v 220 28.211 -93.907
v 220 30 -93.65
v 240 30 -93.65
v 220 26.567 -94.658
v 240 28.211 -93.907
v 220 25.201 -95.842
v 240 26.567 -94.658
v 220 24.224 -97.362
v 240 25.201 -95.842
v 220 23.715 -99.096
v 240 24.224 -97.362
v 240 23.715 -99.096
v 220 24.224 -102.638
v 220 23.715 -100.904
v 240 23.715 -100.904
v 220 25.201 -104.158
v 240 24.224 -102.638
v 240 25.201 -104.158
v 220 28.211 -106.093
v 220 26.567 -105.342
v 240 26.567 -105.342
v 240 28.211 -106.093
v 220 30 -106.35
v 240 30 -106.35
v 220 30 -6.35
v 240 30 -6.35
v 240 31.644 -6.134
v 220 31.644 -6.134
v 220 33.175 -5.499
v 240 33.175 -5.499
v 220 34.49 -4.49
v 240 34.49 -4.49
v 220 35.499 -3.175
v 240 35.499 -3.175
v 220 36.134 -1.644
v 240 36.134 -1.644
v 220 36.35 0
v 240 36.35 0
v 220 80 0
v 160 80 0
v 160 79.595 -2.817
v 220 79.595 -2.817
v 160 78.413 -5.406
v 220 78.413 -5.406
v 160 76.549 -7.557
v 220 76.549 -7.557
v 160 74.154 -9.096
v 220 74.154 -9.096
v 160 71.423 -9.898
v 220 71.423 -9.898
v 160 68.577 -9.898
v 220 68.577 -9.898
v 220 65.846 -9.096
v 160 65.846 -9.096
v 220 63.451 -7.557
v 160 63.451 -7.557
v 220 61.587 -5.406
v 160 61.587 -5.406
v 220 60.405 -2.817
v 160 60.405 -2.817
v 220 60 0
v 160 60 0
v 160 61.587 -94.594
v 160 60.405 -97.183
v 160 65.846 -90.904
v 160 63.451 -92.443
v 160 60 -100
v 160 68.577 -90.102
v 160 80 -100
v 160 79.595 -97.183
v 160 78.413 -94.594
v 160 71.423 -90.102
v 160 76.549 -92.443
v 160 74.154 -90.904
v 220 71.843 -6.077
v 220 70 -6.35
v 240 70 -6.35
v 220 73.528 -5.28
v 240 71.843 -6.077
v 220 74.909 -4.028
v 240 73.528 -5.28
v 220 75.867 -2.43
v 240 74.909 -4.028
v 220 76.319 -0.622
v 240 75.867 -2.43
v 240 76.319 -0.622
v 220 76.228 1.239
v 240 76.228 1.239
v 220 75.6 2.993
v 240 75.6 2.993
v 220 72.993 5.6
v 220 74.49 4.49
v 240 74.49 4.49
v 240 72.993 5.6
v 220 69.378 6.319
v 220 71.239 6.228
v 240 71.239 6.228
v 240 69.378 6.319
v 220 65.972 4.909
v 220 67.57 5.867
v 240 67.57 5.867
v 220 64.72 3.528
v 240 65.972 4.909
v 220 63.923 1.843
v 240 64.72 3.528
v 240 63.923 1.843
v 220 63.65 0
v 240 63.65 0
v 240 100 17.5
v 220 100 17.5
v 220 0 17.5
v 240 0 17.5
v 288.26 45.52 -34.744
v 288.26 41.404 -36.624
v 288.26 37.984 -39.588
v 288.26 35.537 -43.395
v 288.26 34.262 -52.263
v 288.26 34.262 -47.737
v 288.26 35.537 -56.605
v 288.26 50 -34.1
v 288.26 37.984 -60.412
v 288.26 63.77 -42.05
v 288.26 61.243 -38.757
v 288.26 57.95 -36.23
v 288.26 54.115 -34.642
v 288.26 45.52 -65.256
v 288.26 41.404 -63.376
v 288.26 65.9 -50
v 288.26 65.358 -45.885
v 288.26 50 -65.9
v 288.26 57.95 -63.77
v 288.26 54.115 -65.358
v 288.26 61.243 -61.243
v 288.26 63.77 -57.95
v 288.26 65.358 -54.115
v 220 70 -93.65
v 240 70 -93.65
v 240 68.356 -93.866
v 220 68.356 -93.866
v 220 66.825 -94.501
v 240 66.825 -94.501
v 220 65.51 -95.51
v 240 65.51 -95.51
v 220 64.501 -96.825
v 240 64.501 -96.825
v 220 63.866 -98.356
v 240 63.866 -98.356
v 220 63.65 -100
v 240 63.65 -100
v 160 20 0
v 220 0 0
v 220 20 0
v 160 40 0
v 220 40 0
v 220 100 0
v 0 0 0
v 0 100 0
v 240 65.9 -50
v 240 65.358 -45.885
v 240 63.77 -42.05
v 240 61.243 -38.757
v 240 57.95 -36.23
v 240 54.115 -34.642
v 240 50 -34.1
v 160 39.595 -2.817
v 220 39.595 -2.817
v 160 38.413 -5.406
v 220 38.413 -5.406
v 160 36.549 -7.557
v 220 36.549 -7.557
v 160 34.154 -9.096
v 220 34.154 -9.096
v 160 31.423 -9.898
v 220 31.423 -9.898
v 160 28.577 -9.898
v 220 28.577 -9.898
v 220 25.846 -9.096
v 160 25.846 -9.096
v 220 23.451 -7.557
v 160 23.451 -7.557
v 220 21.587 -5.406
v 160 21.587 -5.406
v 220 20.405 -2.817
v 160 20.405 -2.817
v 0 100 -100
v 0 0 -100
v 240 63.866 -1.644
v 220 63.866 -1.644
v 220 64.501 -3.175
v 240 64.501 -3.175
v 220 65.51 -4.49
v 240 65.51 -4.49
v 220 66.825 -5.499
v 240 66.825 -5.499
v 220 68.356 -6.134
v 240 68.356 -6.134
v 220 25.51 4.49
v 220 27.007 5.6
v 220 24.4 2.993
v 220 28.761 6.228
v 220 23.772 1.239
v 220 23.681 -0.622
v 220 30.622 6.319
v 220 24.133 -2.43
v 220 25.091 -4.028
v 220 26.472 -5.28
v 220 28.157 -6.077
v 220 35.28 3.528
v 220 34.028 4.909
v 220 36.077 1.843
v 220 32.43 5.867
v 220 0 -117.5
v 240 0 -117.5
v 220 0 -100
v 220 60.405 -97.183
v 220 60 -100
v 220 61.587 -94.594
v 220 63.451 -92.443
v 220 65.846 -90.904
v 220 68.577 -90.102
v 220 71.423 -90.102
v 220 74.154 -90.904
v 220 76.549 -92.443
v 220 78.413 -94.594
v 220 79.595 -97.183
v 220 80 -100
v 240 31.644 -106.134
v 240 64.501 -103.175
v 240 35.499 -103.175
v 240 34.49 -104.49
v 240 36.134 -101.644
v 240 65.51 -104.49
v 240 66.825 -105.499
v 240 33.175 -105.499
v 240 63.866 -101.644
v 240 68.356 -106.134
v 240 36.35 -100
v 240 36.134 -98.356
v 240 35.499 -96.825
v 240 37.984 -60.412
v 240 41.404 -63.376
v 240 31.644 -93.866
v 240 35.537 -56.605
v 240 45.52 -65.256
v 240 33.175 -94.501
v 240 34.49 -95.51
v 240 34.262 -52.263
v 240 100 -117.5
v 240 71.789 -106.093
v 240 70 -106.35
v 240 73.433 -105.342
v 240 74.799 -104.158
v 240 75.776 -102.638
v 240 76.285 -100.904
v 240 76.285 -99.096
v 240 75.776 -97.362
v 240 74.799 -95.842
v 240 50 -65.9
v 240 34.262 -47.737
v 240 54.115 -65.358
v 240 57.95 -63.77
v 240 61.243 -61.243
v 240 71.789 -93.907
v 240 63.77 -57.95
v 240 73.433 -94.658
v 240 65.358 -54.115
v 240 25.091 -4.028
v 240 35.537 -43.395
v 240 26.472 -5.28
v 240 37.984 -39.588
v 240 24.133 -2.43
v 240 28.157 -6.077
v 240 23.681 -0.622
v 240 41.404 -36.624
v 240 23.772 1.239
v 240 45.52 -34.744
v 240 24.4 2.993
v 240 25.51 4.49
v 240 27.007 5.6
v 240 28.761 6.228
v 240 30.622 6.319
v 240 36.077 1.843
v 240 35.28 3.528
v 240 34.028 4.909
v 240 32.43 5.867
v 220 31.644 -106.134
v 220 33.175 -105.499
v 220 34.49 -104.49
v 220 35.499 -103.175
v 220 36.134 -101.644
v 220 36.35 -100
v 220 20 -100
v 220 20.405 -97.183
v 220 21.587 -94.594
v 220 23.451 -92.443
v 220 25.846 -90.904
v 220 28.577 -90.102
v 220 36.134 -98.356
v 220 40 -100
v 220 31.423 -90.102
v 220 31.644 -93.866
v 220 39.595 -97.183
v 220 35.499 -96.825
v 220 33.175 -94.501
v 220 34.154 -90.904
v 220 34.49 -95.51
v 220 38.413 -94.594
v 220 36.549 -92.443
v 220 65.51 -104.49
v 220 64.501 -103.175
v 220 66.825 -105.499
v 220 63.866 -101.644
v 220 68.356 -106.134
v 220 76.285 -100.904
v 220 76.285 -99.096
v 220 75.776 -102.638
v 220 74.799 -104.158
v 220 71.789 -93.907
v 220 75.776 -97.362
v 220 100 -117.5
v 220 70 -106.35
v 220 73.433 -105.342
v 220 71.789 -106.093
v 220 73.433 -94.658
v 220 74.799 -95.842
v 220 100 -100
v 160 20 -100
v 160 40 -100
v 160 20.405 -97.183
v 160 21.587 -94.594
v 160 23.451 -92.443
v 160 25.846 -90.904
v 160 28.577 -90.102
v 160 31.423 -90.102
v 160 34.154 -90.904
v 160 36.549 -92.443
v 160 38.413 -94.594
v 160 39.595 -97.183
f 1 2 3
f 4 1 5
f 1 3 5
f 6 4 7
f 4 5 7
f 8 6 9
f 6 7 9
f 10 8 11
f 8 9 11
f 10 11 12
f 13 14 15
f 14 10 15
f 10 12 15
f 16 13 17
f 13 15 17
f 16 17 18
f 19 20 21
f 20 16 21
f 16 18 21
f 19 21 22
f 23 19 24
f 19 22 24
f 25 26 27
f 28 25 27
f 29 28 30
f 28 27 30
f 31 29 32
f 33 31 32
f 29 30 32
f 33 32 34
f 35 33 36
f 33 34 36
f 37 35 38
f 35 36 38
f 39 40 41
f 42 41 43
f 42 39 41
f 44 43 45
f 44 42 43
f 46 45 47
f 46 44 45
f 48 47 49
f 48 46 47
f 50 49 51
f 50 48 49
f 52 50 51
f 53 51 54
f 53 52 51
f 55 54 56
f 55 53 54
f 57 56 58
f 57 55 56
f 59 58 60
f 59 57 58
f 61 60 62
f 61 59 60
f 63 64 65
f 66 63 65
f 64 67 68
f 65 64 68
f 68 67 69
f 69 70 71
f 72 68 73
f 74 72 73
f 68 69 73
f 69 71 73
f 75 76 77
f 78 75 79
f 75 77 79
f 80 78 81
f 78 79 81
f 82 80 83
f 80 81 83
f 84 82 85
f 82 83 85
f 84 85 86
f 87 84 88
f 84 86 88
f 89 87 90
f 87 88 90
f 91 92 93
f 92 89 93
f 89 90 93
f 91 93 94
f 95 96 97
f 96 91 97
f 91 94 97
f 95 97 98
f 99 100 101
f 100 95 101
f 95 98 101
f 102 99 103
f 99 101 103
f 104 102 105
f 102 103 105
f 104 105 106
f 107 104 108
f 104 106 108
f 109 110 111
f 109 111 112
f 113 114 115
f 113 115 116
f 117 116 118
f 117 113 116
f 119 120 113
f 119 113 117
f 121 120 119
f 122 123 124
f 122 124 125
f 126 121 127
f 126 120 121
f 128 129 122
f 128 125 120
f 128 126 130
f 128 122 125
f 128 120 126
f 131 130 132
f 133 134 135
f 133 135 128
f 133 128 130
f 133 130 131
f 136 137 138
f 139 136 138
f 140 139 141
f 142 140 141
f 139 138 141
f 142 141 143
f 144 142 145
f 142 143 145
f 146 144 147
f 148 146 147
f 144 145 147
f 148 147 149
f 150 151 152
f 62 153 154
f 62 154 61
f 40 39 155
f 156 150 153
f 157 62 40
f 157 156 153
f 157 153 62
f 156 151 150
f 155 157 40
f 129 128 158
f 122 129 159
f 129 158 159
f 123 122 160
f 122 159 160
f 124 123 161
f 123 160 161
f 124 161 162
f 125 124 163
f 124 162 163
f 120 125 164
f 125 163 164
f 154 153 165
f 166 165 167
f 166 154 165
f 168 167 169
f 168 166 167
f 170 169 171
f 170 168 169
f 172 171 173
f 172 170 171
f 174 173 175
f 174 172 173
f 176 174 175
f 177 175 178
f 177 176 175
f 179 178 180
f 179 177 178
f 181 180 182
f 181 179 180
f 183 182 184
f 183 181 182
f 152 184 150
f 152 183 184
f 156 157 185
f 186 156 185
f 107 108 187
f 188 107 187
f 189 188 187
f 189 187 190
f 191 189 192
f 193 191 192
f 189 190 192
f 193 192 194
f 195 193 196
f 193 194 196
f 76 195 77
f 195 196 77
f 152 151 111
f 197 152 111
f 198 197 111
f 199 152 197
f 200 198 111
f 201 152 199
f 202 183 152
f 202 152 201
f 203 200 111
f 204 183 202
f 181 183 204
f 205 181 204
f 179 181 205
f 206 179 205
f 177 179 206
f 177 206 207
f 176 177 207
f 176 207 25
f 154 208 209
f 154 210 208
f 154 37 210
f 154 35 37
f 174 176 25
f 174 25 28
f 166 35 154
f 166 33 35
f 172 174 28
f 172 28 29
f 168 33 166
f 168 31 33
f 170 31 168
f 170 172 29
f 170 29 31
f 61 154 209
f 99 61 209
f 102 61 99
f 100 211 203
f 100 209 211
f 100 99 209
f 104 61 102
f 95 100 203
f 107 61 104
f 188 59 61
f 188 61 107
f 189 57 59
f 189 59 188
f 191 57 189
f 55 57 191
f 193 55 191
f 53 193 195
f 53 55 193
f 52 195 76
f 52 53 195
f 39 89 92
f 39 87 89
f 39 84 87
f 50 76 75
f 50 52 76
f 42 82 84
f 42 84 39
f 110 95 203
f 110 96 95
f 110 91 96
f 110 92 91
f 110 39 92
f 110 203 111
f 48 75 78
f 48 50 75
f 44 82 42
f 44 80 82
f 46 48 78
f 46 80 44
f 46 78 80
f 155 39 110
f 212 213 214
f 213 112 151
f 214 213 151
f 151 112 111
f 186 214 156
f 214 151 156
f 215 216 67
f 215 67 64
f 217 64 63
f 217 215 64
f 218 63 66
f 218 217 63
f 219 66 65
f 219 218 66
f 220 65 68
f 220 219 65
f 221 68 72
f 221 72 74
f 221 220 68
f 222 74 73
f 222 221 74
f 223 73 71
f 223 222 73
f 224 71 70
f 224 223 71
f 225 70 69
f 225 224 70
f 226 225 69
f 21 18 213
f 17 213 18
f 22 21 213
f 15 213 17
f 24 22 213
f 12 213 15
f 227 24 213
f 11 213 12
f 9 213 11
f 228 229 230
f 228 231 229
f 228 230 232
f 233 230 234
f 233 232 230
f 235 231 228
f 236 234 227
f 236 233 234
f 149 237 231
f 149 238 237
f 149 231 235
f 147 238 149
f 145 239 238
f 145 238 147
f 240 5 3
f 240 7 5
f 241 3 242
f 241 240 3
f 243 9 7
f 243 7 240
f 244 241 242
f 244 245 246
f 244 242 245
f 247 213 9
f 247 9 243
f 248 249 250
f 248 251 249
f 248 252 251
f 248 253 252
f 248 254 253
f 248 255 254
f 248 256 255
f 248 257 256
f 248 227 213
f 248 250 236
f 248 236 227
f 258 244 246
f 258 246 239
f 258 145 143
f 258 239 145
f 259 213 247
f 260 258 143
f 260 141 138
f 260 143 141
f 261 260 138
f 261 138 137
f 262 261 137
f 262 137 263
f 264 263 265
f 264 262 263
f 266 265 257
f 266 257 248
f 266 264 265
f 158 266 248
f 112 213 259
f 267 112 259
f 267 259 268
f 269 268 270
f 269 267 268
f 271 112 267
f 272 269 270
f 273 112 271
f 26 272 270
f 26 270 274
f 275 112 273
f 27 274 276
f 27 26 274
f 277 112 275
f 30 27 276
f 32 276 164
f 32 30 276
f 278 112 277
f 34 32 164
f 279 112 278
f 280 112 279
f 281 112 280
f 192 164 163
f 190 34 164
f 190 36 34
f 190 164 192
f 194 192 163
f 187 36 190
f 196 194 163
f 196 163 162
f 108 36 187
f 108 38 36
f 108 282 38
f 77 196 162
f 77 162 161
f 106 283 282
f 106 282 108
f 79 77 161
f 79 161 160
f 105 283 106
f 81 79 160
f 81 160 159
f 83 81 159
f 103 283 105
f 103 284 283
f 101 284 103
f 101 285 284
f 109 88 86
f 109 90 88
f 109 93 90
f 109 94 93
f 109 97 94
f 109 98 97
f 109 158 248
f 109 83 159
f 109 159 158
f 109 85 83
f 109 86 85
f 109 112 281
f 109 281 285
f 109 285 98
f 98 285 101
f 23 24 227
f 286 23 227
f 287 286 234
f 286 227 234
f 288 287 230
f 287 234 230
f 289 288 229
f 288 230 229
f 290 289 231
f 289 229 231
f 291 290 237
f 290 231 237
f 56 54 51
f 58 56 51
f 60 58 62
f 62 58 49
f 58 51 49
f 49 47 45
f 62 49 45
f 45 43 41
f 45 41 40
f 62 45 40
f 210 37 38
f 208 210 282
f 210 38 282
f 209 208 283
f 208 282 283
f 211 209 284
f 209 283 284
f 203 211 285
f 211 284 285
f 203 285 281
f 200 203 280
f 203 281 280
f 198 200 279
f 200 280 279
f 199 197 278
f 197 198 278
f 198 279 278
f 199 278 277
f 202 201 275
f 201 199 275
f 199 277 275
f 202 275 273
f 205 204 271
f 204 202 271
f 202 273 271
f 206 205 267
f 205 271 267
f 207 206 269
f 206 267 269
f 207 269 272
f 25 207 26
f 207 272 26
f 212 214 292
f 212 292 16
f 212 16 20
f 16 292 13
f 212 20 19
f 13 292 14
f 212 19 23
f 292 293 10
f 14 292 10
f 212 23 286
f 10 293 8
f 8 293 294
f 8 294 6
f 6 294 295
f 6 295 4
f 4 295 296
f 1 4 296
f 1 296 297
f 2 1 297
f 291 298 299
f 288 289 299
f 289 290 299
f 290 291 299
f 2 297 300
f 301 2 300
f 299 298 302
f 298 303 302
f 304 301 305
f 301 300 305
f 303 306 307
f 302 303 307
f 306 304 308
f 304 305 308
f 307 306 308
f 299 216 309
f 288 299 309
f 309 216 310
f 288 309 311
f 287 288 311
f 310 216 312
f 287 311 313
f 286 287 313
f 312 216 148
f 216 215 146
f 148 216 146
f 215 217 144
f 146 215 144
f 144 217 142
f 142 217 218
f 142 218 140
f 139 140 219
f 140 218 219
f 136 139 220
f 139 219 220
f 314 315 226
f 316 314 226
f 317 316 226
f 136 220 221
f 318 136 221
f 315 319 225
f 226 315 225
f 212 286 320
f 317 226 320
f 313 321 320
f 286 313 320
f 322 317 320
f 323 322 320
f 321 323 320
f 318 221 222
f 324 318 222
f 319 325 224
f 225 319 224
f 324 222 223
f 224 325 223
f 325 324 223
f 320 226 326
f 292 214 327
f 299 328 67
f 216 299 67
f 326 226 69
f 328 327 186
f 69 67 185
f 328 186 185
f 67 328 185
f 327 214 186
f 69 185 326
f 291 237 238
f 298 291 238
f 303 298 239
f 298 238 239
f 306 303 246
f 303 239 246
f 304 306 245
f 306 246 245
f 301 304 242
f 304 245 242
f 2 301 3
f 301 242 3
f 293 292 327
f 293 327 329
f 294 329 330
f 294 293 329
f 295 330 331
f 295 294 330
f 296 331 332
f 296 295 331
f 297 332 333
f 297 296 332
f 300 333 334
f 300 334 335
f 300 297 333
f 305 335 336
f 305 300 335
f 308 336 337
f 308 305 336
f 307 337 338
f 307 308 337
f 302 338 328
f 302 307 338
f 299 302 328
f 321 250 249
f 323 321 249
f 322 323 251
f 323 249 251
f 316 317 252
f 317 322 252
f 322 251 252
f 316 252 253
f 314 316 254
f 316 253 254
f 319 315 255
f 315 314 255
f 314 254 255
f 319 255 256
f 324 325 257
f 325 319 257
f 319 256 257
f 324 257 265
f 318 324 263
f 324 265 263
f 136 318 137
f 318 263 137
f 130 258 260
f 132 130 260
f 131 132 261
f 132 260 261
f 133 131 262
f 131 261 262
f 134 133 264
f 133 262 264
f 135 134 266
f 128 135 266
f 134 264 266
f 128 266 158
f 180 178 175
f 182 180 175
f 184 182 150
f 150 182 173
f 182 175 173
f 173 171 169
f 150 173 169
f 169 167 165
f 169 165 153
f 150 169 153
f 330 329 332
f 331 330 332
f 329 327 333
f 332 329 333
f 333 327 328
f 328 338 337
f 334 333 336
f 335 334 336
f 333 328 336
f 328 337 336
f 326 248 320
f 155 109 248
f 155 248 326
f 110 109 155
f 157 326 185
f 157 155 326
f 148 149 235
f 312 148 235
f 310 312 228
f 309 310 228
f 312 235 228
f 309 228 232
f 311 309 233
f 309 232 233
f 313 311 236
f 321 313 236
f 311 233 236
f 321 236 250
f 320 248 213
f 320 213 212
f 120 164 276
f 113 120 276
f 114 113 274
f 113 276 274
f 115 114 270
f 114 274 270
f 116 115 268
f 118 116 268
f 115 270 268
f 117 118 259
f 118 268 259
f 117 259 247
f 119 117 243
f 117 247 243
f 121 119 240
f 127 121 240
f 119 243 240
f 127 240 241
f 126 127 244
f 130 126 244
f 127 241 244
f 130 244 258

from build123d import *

# Parameters (mm, degrees)
SKETCH1_W           = 100
SKETCH1_H           = 100
BOSS_EXTRUDE1_DEPTH = 240
SKETCH3_W           = 20
SKETCH3_H           = 100
BOSS_EXTRUDE2_DEPTH = 17.5
SKETCH4_W           = 20
SKETCH4_H           = 100
BOSS_EXTRUDE3_DEPTH = 17.5
BOSS_EXTRUDE4_DEPTH = 48.26
CUT_EXTRUDE1_DEPTH  = 20
SKETCH8_R           = 10
CUT_EXTRUDE2_DEPTH  = 60


with BuildPart() as part:
    # Sketch1 → Boss-Extrude1 (new body)
    with BuildSketch(Plane(origin=(0, 0, 0), x_dir=(0, 0, -1), z_dir=(1, 0, 0))):
        with Locations((50, 50)):
            Rectangle(SKETCH1_W, SKETCH1_H)
    extrude(amount=BOSS_EXTRUDE1_DEPTH)

    # Sketch3 → Boss-Extrude2 (add)
    with BuildSketch(Plane.XY):
        with Locations((230, 50)):
            Rectangle(SKETCH3_W, SKETCH3_H)
    extrude(amount=BOSS_EXTRUDE2_DEPTH)

    # Sketch4 → Boss-Extrude3 (add)
    with BuildSketch(Plane(origin=(0, 0, -100), x_dir=(-1, 0, 0), z_dir=(0, 0, -1))):
        with Locations((-230, 50)):
            Rectangle(SKETCH4_W, SKETCH4_H)
    extrude(amount=BOSS_EXTRUDE3_DEPTH)

    # Sketch6 → Boss-Extrude4 (add)
    with BuildSketch(Plane(origin=(240, 0, 0), x_dir=(0, 0, -1), z_dir=(1, 0, 0))):
        with BuildLine():
            ThreePointArc((65.9, 50), (61.242997821, 61.242997821), (50, 65.9))
            Line((50, 65.9), (50, 50))
            Line((50, 50), (34.1, 50))
            ThreePointArc((34.1, 50), (50, 34.1), (65.9, 50))
        make_face()
        with BuildLine():
            Line((50, 50), (50, 65.9))
            ThreePointArc((50, 65.9), (38.757002179, 61.242997821), (34.1, 50))
            Line((34.1, 50), (50, 50))
        make_face()
    extrude(amount=BOSS_EXTRUDE4_DEPTH)

    # Sketch7 → Cut-Extrude1 (cut)
    with BuildSketch(Plane(origin=(240, 0, 0), x_dir=(0, 0, -1), z_dir=(1, 0, 0))):
        with BuildLine():
            Line((0, 63.65), (0, 70))
            Line((0, 70), (6.35, 70))
            ThreePointArc((6.35, 70), (-4.490128061, 74.490128061), (0, 63.65))
        make_face()
        with BuildLine():
            Line((6.35, 70), (0, 70))
            Line((0, 70), (0, 63.65))
            ThreePointArc((0, 63.65), (4.490128061, 65.509871939), (6.35, 70))
        make_face()
        with BuildLine():
            ThreePointArc((6.35, 30), (4.490128061, 34.490128061), (0, 36.35))
            Line((0, 36.35), (0, 30))
            Line((0, 30), (6.35, 30))
        make_face()
        with BuildLine():
            Line((0, 30), (0, 36.35))
            ThreePointArc((0, 36.35), (-4.490128061, 25.509871939), (6.35, 30))
            Line((6.35, 30), (0, 30))
        make_face()
        with BuildLine():
            ThreePointArc((106.35, 30), (104.490128061, 34.490128061), (100, 36.35))
            Line((100, 36.35), (100, 30))
            Line((100, 30), (93.65, 30))
            ThreePointArc((93.65, 30), (100, 23.65), (106.35, 30))
        make_face()
        with BuildLine():
            Line((100, 30), (100, 36.35))
            ThreePointArc((100, 36.35), (95.509871939, 34.490128061), (93.65, 30))
            Line((93.65, 30), (100, 30))
        make_face()
        with BuildLine():
            ThreePointArc((106.35, 70), (100, 76.35), (93.65, 70))
            Line((93.65, 70), (100, 70))
            Line((100, 70), (100, 63.65))
            ThreePointArc((100, 63.65), (104.490128061, 65.509871939), (106.35, 70))
        make_face()
        with BuildLine():
            Line((100, 70), (93.65, 70))
            ThreePointArc((93.65, 70), (95.509871939, 65.509871939), (100, 63.65))
            Line((100, 63.65), (100, 70))
        make_face()
    extrude(amount=-CUT_EXTRUDE1_DEPTH, mode=Mode.SUBTRACT)

    # Sketch8 → Cut-Extrude2 (cut)
    with BuildSketch(Plane.ZY.offset(-220)):
        with Locations((0, 70)):
            Circle(SKETCH8_R)
        with Locations((0, 30)):
            Circle(SKETCH8_R)
        with Locations((-100, 70)):
            Circle(SKETCH8_R)
        with Locations((-100, 30)):
            Circle(SKETCH8_R)
    extrude(amount=CUT_EXTRUDE2_DEPTH, mode=Mode.SUBTRACT)


solid = part.part
